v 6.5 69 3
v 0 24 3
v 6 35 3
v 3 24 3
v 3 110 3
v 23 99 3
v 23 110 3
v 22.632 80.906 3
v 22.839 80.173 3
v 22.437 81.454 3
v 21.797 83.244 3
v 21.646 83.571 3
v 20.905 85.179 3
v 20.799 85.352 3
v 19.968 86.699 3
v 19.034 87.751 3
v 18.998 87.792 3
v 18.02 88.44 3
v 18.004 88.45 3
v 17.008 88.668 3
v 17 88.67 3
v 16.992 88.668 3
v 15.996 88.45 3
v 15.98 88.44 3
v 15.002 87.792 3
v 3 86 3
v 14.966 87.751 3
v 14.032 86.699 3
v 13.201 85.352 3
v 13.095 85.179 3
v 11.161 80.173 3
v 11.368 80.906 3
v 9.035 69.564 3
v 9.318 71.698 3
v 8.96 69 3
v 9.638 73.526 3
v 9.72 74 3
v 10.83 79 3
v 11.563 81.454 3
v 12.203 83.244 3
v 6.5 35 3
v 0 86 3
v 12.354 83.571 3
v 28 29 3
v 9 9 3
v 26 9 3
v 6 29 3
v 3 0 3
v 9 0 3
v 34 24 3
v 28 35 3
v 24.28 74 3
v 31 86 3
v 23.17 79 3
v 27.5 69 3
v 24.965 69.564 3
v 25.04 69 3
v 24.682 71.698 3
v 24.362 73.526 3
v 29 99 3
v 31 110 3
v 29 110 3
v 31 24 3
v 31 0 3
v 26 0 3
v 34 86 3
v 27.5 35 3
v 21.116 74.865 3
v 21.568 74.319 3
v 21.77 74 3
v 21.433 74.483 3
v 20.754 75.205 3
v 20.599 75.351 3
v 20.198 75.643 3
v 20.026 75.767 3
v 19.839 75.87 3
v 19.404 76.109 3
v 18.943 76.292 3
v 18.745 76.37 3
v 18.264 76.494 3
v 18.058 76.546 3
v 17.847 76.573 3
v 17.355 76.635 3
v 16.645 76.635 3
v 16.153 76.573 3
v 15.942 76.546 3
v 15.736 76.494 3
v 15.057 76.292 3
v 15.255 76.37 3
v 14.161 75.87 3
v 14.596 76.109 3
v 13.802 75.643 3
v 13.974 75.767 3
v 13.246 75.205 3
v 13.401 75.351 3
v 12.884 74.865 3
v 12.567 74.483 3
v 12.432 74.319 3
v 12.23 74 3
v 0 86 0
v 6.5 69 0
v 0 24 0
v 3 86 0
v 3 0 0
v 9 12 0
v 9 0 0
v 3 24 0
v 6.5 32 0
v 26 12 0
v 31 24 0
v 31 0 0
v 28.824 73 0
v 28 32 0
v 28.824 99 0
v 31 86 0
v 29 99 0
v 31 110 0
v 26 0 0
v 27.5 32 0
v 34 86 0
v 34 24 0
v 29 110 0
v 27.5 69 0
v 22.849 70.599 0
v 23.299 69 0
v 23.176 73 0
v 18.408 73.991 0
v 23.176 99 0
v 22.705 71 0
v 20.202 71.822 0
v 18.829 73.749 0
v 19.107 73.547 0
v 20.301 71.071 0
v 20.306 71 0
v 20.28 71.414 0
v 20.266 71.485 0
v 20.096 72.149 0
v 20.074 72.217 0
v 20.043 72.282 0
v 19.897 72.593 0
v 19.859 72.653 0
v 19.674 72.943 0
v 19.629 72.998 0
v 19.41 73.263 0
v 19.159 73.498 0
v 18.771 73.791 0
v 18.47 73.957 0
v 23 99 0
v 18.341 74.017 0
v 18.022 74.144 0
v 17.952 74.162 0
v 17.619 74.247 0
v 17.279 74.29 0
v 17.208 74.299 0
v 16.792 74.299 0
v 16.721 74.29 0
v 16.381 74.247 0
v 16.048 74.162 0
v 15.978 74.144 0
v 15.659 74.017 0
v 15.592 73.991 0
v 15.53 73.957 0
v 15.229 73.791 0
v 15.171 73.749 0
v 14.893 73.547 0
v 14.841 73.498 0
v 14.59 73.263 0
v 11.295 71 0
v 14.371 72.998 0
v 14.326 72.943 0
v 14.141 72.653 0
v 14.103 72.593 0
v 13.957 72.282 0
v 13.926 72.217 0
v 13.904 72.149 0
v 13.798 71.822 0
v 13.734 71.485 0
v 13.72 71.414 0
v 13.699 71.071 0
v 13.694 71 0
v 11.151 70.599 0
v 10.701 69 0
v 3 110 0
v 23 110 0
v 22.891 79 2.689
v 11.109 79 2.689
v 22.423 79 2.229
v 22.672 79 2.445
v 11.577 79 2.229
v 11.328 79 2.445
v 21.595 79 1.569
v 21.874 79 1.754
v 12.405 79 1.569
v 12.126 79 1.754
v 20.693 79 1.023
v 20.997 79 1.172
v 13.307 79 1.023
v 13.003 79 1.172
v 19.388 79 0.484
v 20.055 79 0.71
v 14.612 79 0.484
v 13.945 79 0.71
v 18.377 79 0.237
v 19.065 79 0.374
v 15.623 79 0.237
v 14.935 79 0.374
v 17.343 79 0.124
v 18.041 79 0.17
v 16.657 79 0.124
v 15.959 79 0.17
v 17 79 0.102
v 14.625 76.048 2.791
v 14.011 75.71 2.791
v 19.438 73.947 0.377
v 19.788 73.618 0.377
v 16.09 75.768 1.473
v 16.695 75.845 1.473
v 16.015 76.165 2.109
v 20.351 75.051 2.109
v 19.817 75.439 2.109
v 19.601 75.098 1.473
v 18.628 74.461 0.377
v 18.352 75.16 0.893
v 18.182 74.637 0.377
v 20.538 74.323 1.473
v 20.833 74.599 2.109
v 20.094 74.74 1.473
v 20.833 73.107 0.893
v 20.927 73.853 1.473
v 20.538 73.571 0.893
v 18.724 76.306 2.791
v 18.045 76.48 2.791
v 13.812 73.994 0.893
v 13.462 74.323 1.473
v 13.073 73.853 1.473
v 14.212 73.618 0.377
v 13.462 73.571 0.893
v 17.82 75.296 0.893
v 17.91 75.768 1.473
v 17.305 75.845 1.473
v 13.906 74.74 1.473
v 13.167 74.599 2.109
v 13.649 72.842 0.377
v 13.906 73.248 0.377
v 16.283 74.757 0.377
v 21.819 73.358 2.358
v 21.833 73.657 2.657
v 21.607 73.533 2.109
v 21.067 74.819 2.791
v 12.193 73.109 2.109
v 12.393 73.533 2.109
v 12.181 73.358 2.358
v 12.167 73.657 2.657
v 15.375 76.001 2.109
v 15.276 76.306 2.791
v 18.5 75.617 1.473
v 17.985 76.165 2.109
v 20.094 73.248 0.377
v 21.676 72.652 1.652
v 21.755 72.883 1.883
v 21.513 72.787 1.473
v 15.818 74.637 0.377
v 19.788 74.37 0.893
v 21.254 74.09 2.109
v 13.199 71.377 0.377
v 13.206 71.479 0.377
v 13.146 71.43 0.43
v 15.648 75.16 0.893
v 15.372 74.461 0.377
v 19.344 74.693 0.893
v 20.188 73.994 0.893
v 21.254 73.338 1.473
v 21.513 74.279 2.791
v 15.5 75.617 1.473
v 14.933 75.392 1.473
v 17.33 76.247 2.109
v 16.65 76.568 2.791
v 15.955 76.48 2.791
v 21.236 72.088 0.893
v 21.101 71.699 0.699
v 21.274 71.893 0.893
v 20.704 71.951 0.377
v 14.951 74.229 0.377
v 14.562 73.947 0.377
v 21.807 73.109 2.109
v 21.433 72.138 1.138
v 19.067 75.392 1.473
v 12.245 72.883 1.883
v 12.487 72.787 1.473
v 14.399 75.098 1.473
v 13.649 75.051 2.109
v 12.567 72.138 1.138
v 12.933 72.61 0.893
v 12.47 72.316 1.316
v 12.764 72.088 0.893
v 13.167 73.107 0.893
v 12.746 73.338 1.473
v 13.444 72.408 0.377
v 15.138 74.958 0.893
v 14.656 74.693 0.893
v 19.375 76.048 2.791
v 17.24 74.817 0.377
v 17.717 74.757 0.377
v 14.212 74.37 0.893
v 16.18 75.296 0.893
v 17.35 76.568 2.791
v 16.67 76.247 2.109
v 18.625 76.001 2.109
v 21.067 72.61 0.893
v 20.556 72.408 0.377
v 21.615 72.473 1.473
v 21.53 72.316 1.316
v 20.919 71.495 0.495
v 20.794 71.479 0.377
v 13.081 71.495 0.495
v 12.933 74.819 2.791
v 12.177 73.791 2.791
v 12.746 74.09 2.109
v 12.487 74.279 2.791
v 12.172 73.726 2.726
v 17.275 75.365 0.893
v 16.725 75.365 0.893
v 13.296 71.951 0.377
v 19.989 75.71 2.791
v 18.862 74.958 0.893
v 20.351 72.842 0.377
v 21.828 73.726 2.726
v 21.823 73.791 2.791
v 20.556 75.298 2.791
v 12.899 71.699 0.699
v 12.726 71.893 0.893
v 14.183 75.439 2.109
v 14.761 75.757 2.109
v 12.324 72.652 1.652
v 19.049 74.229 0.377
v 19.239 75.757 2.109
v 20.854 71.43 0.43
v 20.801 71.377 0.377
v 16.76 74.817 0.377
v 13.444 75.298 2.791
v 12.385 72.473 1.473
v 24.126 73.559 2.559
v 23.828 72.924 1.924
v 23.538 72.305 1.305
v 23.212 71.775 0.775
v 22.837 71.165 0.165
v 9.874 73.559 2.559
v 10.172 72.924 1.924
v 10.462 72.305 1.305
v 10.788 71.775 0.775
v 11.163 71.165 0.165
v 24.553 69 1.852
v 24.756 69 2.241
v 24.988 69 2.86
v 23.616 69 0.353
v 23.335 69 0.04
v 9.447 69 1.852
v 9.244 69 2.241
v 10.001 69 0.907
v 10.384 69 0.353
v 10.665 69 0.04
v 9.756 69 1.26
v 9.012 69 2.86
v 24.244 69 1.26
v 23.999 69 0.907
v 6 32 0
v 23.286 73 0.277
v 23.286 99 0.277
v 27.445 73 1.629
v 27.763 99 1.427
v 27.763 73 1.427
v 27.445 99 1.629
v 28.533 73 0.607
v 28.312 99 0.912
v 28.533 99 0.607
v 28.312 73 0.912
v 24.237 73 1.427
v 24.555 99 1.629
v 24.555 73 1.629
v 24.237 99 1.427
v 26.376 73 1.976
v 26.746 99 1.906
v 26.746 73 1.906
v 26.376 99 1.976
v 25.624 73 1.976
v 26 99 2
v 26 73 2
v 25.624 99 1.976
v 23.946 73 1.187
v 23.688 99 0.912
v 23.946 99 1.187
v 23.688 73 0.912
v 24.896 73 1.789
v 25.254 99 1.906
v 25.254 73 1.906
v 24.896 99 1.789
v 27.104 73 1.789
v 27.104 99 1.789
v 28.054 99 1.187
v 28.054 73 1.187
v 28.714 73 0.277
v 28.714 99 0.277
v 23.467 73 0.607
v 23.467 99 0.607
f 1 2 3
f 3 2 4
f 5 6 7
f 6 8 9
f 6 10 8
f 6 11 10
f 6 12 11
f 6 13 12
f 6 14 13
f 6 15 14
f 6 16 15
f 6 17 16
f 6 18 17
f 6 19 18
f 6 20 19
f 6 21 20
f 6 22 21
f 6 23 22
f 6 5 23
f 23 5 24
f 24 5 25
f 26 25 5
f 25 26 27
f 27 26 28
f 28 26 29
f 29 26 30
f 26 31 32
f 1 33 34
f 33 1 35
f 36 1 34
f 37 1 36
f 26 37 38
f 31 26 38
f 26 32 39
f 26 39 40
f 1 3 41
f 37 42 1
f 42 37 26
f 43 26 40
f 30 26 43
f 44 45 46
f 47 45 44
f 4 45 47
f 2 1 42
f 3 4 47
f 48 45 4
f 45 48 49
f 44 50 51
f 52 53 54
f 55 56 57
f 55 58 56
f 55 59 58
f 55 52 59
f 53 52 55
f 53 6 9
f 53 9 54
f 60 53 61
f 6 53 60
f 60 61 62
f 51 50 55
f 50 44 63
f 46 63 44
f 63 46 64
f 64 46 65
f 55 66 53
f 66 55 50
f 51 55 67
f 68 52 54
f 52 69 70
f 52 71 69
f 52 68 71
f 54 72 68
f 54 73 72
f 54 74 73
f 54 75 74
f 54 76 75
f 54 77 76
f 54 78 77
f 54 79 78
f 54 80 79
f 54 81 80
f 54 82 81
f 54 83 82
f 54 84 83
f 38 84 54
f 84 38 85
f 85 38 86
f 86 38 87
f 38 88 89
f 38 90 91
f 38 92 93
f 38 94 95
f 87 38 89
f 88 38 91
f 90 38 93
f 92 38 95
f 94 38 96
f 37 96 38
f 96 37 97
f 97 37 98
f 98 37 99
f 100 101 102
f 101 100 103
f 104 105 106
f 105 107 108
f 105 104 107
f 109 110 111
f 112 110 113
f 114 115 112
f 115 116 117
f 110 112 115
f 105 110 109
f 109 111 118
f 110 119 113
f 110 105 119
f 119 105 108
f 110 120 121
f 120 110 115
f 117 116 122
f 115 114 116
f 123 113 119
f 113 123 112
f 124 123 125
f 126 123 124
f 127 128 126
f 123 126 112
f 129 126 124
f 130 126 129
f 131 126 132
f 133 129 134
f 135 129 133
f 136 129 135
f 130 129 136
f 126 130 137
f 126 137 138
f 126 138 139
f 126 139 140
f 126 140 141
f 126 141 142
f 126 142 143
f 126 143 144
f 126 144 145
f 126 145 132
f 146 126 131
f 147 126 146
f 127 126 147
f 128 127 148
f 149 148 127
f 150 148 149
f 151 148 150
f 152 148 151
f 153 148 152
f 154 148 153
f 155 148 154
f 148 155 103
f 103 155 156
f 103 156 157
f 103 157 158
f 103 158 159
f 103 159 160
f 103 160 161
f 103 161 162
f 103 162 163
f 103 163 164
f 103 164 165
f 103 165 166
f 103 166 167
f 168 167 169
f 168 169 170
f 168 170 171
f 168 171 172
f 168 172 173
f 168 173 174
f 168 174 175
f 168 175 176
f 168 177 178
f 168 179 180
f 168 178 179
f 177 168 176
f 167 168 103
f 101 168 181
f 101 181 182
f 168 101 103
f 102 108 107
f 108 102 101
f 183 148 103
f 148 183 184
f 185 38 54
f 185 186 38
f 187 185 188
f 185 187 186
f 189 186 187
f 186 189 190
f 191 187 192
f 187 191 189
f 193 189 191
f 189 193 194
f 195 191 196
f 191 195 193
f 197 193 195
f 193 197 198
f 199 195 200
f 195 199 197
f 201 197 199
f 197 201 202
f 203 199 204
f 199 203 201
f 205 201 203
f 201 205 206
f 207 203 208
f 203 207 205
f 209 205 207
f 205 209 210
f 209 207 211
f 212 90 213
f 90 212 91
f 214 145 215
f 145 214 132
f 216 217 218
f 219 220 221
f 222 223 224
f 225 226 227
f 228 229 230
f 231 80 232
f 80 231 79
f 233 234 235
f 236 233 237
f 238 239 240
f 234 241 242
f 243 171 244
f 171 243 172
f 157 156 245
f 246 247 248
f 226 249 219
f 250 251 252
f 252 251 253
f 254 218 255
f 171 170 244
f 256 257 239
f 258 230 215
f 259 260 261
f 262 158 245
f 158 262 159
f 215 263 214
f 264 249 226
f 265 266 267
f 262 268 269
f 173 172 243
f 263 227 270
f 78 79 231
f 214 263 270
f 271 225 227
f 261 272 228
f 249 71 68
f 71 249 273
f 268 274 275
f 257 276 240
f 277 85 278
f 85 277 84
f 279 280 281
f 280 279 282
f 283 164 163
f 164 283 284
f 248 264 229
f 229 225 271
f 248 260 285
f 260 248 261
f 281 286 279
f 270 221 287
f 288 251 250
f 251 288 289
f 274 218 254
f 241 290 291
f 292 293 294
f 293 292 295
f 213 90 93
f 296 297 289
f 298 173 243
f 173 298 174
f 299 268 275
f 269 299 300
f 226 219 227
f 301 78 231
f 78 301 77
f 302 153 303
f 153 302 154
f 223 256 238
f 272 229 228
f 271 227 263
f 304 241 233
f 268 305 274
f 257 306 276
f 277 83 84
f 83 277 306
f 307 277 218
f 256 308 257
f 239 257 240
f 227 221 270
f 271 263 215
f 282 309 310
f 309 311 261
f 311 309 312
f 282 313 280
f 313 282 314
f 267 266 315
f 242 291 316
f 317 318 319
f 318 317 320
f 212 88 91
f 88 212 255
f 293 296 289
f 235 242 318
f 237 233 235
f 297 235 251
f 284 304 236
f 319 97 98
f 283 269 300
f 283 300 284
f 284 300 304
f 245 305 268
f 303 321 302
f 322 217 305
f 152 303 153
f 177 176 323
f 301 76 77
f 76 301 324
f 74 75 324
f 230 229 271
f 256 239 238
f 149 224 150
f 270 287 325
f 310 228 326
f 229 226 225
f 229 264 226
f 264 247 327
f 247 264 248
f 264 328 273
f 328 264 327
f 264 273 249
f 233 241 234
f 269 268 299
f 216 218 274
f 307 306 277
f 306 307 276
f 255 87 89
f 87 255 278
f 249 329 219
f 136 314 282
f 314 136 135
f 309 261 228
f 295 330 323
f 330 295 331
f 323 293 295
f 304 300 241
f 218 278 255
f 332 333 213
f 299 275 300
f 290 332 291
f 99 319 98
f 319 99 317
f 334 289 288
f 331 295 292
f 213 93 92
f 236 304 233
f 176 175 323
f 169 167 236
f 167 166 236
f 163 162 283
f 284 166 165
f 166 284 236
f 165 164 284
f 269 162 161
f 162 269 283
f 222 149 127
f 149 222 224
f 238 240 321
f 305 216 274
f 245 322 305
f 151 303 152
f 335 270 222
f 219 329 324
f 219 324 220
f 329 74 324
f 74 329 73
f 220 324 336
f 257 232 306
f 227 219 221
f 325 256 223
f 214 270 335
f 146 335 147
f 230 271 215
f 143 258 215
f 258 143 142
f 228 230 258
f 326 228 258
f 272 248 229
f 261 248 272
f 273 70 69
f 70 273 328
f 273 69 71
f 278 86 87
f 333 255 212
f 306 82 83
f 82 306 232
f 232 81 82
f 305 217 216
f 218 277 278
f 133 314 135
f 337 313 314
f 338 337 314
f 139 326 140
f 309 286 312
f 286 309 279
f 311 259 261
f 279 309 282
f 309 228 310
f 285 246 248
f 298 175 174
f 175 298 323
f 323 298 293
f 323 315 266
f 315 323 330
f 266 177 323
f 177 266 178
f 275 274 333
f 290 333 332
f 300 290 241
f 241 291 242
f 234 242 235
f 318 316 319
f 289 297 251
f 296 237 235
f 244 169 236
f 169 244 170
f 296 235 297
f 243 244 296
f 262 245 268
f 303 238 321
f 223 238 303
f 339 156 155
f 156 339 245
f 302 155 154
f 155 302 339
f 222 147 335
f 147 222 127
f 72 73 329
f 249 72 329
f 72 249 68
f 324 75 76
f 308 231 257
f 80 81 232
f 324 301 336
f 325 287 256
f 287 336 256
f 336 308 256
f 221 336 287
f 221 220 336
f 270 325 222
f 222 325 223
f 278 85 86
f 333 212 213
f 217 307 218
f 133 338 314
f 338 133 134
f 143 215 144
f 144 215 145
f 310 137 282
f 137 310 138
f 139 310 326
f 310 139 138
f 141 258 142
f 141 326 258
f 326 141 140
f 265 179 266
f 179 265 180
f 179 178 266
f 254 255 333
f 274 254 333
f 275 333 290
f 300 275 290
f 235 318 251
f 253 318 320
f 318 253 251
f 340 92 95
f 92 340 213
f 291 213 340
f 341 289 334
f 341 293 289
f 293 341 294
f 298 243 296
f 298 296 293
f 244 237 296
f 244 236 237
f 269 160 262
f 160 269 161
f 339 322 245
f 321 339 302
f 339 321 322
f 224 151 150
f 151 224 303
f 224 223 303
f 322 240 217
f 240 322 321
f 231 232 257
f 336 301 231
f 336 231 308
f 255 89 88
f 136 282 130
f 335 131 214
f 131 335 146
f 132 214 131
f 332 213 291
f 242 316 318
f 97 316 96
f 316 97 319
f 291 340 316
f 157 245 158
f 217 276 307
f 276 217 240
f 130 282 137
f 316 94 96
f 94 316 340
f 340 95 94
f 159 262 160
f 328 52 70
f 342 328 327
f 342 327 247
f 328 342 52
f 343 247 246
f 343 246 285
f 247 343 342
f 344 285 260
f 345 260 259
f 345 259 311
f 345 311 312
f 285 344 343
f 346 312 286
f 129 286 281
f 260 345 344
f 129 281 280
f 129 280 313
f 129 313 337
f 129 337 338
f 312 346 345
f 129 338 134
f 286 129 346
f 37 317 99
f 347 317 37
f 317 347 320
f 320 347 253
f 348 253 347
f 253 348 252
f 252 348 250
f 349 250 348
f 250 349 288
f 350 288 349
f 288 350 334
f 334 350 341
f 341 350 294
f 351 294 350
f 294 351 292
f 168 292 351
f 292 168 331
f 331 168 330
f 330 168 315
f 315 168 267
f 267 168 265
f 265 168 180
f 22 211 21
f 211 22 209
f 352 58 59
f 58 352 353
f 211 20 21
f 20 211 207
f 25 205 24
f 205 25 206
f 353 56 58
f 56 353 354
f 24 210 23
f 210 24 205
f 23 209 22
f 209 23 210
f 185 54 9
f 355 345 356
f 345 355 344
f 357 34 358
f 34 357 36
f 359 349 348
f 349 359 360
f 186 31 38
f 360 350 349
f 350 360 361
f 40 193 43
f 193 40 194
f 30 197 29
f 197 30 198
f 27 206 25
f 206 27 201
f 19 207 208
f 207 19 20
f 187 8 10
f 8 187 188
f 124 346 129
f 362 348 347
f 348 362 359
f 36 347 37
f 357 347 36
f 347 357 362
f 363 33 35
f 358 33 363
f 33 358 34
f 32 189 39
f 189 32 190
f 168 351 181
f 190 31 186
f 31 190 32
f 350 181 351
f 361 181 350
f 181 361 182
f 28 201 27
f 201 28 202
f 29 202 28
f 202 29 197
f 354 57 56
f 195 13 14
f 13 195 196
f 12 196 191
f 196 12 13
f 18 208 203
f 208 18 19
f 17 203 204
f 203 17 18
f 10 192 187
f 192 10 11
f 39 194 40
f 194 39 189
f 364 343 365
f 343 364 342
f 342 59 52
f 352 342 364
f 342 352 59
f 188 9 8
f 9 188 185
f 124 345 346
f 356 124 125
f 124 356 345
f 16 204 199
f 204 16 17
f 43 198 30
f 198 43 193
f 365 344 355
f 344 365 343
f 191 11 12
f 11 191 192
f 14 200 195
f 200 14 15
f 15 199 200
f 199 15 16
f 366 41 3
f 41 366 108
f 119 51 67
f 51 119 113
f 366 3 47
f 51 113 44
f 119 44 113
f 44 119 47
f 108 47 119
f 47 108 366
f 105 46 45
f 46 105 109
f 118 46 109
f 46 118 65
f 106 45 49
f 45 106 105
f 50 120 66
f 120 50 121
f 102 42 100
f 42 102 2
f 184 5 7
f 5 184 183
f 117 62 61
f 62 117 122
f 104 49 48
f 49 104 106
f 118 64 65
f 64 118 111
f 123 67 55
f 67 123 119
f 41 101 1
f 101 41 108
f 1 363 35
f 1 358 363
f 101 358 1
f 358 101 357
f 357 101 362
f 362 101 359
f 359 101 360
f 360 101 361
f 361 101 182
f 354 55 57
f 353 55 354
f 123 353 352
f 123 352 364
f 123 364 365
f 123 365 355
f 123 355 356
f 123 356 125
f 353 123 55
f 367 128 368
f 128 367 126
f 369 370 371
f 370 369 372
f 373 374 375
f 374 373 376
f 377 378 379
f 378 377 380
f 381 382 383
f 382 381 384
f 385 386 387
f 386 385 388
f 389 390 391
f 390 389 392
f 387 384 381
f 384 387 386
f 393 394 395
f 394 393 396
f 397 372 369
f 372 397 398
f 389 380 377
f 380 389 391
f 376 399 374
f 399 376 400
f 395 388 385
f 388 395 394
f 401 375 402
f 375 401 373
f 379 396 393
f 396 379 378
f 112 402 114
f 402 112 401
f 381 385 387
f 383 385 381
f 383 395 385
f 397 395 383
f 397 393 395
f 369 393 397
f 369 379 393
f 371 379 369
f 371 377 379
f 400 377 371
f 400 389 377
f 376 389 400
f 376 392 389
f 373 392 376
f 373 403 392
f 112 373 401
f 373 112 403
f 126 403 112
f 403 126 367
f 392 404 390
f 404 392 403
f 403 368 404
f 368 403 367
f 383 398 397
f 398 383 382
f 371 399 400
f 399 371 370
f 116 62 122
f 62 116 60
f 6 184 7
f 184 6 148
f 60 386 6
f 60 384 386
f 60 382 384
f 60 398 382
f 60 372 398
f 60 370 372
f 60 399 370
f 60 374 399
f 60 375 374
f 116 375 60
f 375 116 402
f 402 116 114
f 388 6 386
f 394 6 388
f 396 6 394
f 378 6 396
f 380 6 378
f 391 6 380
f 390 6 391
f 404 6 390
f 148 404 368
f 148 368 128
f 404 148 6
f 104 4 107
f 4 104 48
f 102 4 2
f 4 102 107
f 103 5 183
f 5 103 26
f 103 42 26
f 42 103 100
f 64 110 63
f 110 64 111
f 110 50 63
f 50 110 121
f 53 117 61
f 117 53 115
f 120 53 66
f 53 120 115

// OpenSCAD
$fn=50;   // For persion of polygons



difference(){
cube([34,110,3]);  //lower plate.
translate([6.5,32,-10]){
cube([21,37,20]);
}
difference(){
translate([17,54,2]){ // bore
rotate([0,90,90]){
rotate([0,-15,0]){
    cylinder(34,r=8,9);
}}}
translate([0,71,0]){
difference(){
cube([34,8,3]);  //ramp.
translate([26,-5,-1]){ // grove
rotate([0,90,90]){
rotate([0,0,0]){
    cylinder(50,r=3,3);
}}}
translate([17,0,5]){
    sphere(6);}
translate([-2,0,0]){
rotate([45,0,0]){
cube([40,12,3]);
}}}}
}
translate([26,73,-1]){ // grove
rotate([0,90,90]){
rotate([0,0,0]){
    cylinder(50,r=3,3);
}}}
translate([23,99,-10]){ // notch
cube([6,40,30]);
}
translate([-1,-1,-1]){
cube([4,25,6]);
}
translate([-1,86,-1]){
cube([4,25,6]);
}
translate([31,-1,-1]){
cube([4,25,6]);
}
translate([31,86,-1]){
cube([4,25,6]);
}

translate([-3,27,3]){  // firingpin ramp
difference(){   //ramp
translate([9,5,-3]){
rotate([45,0,0]){
    cube([22,5,5]);
}}
translate([8,0,2]){
    cube([25,30,5]);
}}}

translate([0,0,0]){ // move this
union(){   // makes it nice
translate([9,-5,-1]){  // pin catch
cube([17,14,6]); // [16,x,6]
}
translate([35,4,0]){
rotate([0,180,0]){
difference(){   //ramp
translate([9,5,-3]){
rotate([45,0,0]){
    cube([17,5,5]);
}}
translate([8,0,2]){
    cube([20,30,5]);
}}}}}}

}
/*
translate([0,78,0]){
difference(){
cube([34,8,3]);  //ramp.
translate([26,-5,-1]){ // grove
rotate([0,90,90]){
rotate([0,0,0]){
    cylinder(50,r=3,3);
}}}
translate([-2,0,0]){
rotate([45,0,0]){
cube([40,12,3]);
}}}}*/
